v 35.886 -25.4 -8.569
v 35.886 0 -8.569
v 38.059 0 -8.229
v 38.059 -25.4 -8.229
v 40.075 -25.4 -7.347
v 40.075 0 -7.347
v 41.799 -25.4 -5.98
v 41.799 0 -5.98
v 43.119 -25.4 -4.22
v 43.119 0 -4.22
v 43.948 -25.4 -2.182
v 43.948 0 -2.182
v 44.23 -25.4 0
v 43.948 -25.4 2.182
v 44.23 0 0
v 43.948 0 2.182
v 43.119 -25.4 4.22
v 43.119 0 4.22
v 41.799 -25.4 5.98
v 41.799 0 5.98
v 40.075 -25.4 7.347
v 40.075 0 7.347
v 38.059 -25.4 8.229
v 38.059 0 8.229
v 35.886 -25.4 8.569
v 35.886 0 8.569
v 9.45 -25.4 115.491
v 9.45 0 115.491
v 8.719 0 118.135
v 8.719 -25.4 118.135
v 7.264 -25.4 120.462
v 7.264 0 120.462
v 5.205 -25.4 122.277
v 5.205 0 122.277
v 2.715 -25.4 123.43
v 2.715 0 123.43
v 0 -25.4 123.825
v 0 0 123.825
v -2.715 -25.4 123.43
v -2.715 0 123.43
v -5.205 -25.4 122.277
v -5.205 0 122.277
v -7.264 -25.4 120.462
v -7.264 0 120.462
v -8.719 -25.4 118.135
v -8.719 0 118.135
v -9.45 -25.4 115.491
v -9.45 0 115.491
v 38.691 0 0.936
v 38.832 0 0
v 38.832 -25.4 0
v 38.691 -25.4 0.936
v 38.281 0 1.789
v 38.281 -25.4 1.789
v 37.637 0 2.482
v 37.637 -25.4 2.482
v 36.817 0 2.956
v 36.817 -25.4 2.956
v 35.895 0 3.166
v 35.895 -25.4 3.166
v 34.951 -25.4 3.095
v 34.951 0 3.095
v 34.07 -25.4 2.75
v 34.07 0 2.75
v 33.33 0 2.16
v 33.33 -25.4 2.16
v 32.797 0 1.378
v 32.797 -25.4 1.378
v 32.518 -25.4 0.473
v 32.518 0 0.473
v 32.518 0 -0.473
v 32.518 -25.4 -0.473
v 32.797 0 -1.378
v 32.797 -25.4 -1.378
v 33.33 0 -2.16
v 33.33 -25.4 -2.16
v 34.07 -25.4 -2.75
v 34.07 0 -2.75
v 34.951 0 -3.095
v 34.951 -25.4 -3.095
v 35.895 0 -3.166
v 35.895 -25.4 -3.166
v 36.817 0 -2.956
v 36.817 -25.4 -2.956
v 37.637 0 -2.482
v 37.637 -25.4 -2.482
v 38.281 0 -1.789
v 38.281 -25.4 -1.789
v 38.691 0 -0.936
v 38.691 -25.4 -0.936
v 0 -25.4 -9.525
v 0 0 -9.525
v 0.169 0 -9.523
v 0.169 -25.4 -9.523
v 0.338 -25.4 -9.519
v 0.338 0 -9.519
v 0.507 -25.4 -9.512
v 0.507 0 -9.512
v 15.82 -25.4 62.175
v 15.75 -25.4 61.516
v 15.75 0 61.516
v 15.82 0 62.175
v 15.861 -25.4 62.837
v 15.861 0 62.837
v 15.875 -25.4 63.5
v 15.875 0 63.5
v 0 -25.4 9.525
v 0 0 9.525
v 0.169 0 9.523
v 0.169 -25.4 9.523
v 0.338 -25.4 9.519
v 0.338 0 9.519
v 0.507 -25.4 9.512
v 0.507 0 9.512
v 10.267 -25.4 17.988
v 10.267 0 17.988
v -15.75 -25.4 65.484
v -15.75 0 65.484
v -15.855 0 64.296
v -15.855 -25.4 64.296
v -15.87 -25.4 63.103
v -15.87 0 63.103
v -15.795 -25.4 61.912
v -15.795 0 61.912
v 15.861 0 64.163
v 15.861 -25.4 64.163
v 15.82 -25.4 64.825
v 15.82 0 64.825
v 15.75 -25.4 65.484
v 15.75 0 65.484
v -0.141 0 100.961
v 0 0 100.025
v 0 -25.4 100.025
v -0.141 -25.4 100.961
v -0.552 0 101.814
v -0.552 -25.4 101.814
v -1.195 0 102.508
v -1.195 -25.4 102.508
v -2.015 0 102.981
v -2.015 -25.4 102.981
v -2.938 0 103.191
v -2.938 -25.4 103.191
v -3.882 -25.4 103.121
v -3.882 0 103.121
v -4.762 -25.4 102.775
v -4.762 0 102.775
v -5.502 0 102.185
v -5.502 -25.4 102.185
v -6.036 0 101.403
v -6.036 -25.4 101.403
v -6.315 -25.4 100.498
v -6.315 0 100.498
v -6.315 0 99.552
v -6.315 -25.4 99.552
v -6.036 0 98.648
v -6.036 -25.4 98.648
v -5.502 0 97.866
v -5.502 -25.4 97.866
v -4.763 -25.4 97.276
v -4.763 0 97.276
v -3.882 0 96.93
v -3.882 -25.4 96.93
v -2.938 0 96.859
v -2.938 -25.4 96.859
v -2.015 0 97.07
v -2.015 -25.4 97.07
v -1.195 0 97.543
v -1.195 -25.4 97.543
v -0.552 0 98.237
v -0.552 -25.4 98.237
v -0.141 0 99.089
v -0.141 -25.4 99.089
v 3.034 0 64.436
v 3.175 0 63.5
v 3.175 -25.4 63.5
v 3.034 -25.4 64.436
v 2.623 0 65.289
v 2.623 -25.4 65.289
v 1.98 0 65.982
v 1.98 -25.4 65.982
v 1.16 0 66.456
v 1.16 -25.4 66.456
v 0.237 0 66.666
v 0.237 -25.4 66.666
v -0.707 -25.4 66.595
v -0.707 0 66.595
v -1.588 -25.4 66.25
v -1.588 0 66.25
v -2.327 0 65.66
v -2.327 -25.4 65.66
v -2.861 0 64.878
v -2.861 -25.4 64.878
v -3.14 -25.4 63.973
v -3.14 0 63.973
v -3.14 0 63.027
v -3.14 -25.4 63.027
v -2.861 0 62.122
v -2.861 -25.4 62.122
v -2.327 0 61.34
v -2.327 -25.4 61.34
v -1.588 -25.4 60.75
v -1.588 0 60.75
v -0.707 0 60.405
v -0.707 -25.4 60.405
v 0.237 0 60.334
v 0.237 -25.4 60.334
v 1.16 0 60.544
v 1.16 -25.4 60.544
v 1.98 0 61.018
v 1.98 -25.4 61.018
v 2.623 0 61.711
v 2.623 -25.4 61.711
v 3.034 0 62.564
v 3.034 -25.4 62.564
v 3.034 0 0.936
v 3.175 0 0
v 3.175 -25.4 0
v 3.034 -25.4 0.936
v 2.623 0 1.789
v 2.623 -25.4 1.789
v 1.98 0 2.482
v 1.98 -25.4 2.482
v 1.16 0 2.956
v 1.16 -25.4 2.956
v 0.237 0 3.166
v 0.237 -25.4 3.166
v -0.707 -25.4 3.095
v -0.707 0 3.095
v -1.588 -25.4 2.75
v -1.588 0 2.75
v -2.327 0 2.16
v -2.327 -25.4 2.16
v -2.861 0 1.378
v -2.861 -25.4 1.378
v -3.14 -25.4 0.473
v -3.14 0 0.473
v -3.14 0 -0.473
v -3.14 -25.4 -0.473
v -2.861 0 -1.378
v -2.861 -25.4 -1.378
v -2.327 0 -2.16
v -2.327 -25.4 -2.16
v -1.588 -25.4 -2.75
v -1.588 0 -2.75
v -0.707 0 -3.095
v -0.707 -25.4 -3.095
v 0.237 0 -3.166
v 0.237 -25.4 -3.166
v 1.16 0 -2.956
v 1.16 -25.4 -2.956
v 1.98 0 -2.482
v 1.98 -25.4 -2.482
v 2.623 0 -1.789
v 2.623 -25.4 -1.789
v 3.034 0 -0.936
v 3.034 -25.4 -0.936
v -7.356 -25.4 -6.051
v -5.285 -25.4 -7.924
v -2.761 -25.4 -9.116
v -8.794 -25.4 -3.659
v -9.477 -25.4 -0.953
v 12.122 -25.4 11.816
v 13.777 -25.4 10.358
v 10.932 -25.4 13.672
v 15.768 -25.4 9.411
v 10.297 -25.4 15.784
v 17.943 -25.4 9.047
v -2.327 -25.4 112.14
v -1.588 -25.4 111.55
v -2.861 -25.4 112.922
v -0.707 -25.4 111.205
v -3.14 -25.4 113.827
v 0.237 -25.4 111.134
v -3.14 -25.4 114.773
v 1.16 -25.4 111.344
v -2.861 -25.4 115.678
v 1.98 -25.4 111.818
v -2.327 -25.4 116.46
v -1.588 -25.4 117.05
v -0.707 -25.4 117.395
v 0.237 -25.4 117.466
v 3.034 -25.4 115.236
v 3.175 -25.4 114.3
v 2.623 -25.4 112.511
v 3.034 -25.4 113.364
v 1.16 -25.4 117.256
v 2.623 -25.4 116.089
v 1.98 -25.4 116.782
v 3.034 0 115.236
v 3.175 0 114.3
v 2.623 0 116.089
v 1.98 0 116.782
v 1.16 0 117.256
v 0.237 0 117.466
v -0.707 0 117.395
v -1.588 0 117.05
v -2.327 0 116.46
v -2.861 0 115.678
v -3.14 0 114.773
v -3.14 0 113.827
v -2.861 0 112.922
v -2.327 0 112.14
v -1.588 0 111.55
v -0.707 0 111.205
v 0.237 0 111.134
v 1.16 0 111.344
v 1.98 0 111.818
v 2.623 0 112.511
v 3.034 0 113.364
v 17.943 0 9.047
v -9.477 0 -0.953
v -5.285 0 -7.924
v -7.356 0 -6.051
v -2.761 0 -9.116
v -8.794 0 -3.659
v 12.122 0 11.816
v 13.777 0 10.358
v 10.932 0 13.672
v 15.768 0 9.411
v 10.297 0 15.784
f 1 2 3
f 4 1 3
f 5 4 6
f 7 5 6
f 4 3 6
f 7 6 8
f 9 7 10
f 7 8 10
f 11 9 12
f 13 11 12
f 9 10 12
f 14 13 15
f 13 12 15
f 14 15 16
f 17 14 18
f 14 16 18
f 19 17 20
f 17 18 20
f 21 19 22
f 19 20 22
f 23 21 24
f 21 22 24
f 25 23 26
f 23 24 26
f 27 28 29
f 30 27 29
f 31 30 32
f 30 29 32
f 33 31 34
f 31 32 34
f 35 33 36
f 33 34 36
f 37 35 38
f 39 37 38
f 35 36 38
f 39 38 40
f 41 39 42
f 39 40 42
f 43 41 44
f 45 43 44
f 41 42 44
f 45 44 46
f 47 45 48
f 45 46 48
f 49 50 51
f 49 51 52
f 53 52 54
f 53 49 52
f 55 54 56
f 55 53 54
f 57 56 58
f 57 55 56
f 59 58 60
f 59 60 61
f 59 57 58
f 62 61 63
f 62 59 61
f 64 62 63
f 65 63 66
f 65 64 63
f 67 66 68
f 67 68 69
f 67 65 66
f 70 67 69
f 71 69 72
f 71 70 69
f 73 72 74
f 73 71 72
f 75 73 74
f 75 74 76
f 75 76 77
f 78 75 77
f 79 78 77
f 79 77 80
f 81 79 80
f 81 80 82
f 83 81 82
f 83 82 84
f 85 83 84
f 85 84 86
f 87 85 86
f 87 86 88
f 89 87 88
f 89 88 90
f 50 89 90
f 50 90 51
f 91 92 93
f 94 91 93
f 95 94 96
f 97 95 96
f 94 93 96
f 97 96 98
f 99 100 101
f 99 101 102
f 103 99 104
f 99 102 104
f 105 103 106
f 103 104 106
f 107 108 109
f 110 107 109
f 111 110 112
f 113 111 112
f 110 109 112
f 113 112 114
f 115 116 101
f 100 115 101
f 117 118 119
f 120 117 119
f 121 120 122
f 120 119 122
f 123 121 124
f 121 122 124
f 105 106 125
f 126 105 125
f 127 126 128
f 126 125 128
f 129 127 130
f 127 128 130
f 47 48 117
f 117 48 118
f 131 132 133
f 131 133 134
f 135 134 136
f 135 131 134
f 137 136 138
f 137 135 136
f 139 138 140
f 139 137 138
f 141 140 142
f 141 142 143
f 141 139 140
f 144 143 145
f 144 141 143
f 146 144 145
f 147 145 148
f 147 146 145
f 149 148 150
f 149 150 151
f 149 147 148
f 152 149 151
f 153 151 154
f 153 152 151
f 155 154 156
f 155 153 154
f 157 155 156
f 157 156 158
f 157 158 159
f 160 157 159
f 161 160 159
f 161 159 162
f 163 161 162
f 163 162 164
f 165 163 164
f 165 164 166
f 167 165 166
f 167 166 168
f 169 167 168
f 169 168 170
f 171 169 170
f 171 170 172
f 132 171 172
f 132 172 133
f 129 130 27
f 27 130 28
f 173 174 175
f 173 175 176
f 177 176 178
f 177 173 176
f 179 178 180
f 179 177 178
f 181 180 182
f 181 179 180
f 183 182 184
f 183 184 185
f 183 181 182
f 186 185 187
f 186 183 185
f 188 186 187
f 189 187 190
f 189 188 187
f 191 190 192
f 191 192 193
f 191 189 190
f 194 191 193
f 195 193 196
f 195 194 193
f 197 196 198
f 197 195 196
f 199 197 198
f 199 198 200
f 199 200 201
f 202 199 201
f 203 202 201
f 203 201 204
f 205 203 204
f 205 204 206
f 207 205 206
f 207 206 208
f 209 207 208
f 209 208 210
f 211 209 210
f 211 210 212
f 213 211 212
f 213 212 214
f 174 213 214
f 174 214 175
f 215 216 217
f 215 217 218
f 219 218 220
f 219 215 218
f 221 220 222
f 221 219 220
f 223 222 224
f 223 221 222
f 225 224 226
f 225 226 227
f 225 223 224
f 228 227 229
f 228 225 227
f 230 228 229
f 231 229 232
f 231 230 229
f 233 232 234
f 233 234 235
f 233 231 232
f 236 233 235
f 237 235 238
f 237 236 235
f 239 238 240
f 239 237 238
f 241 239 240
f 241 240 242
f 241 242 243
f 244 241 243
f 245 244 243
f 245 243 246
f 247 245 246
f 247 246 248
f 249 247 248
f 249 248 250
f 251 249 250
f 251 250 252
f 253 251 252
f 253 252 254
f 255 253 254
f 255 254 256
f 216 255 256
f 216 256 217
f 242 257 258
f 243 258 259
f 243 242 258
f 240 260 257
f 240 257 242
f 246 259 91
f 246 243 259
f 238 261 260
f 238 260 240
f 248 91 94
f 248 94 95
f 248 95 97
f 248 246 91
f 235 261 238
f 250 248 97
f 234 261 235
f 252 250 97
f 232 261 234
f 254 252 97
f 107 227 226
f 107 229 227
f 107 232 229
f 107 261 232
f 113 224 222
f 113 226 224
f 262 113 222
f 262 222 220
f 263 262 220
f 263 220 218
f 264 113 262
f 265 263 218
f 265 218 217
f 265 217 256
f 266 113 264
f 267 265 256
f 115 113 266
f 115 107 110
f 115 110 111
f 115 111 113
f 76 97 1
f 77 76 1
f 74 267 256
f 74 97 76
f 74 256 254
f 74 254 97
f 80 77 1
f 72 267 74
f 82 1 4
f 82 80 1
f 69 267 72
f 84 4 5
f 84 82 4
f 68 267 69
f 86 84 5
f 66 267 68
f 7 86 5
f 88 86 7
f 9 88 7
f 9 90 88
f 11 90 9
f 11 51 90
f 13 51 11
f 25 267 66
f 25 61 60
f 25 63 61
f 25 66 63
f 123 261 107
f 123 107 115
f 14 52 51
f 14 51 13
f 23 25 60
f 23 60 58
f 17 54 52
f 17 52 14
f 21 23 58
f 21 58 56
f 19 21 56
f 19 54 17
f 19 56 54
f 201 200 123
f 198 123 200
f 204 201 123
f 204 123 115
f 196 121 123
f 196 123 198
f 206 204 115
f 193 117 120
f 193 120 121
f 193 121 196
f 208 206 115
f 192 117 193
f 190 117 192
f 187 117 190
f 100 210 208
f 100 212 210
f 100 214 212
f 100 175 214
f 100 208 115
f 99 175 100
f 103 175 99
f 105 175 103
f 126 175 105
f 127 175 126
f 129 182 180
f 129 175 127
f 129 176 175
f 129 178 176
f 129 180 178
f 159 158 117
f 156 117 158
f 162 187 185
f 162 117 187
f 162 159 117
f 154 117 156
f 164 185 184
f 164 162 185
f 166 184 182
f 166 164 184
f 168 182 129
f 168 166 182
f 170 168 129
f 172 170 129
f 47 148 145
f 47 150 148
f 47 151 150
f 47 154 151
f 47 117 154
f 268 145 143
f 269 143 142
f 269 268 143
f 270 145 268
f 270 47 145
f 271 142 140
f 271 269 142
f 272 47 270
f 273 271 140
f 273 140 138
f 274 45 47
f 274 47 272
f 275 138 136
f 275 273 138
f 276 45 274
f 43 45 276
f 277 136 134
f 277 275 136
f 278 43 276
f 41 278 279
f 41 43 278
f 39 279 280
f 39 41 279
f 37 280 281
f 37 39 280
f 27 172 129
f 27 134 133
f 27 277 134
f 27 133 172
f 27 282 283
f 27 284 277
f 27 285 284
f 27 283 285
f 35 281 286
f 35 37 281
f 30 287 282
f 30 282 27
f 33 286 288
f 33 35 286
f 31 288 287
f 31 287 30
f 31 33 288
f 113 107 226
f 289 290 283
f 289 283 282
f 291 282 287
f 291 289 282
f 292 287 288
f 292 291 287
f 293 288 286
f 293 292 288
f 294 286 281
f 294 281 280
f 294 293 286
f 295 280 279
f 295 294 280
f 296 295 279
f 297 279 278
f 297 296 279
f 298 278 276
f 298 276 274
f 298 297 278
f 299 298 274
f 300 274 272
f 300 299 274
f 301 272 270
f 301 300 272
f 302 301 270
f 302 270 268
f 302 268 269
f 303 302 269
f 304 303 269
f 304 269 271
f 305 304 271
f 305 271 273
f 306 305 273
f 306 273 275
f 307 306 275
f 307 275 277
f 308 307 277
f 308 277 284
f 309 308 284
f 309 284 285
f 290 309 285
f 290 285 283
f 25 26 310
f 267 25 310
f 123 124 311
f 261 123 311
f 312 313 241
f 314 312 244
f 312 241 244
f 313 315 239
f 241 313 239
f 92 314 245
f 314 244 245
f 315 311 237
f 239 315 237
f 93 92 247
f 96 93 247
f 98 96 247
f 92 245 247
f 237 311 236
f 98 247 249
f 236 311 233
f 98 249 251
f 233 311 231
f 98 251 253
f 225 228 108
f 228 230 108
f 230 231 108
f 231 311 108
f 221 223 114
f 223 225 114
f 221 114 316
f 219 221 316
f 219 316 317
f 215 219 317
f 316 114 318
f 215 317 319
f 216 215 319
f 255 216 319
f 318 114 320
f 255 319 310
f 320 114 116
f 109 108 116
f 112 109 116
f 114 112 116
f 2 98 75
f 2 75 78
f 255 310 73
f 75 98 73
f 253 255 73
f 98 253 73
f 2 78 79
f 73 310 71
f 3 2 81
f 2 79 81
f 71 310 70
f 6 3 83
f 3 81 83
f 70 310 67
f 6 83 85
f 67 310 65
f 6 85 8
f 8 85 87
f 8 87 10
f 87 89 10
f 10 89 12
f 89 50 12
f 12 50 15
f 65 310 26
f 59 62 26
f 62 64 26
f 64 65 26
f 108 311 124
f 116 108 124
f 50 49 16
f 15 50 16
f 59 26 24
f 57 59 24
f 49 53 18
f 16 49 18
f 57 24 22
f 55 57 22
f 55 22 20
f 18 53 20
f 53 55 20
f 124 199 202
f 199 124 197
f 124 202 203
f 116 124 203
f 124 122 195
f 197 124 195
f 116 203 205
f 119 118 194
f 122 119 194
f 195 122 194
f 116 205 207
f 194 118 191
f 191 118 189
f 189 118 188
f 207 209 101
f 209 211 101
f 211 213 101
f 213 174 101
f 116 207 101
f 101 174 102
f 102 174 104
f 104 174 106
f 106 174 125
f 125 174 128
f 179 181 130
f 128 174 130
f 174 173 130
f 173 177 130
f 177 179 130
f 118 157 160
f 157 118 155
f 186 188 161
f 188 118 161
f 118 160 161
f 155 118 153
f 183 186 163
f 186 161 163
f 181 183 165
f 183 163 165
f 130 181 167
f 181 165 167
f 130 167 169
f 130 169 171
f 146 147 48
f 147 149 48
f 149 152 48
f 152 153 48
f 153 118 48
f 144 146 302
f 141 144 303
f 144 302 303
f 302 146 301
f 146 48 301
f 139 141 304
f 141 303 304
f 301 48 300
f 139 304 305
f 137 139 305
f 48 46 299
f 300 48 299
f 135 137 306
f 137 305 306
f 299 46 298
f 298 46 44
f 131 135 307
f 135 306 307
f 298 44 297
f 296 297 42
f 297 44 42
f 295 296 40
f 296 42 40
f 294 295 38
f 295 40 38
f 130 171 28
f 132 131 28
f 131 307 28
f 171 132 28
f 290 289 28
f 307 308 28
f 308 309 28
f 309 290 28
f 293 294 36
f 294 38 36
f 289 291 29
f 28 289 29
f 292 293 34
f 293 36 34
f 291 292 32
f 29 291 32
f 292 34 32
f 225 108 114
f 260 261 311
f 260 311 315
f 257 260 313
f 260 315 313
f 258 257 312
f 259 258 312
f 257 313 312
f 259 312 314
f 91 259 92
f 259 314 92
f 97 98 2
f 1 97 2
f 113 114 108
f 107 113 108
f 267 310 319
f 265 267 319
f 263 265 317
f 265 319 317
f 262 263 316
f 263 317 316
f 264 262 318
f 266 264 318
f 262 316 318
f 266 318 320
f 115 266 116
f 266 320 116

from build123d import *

# Parameters (mm, degrees)
F0_R     = 3.175
F1_DEPTH = 3.048
F2_DEPTH = 25.4
F3_DEPTH = 3.048


with BuildPart() as f1:
    # F0 (on Front) → F1 (new body)
    with BuildSketch(Plane.XZ):
        with BuildLine():
            ThreePointArc((-9.450293, 115.490625), (-0.596483, 104.793695), (9.525, 114.3))
            ThreePointArc((9.525, 114.3), (9.506305, 114.896483), (9.450293, 115.490625))
            ThreePointArc((9.450293, 115.490625), (0, 123.825), (-9.450293, 115.490625))
        make_face()
        with Locations((0, 114.3)):
            Circle(F0_R, mode=Mode.SUBTRACT)
        with BuildLine():
            ThreePointArc((9.450293, 115.490625), (9.506305, 114.896483), (9.525, 114.3))
            ThreePointArc((9.525, 114.3), (-0.596483, 104.793695), (-9.450293, 115.490625))
            Line((-9.450293, 115.490625), (-15.750488, 65.484375))
            ThreePointArc((-15.750488, 65.484375), (0, 79.375), (15.750488, 65.484375))
            Line((15.750488, 65.484375), (9.450293, 115.490625))
        make_face()
        with Locations((-3.175, 100.0252)):
            Circle(F0_R, mode=Mode.SUBTRACT)
        with BuildLine():
            ThreePointArc((15.875, 63.5), (15.843841, 64.494139), (15.750488, 65.484375))
            ThreePointArc((15.750488, 65.484375), (0, 79.375), (-15.750488, 65.484375))
            ThreePointArc((-15.750488, 65.484375), (-15.873744, 63.699705), (-15.795426, 61.9125))
            ThreePointArc((-15.795426, 61.9125), (-0.199705, 47.626256), (15.750488, 61.515625))
            ThreePointArc((15.750488, 61.515625), (15.843841, 62.505861), (15.875, 63.5))
        make_face()
        with Locations((0, 63.5)):
            Circle(F0_R, mode=Mode.SUBTRACT)
        with BuildLine():
            ThreePointArc((15.750488, 61.515625), (-0.199705, 47.626256), (-15.795426, 61.9125))
            Line((-15.795426, 61.9125), (-9.477255, -0.9525))
            ThreePointArc((-9.477255, -0.9525), (-7.063929, 6.389564), (0, 9.525))
            ThreePointArc((0, 9.525), (0.253535, 9.521625), (0.506891, 9.511503))
            ThreePointArc((0.506891, 9.511503), (6.912082, 6.553529), (9.525, 0))
            ThreePointArc((9.525, 0), (6.912082, -6.553529), (0.506891, -9.511503))
            Line((0.506891, -9.511503), (35.885598, -8.569463))
            ThreePointArc((35.885598, -8.569463), (27.084916, 0), (35.885598, 8.569463))
            Line((35.885598, 8.569463), (17.942799, 9.047231))
            ThreePointArc((17.942799, 9.047231), (12.122303, 11.815881), (10.266572, 17.988389))
            Line((10.266572, 17.988389), (15.750488, 61.515625))
        make_face()
        with BuildLine():
            ThreePointArc((0, 9.525), (-7.063929, 6.389564), (-9.477255, -0.9525))
            ThreePointArc((-9.477255, -0.9525), (-6.389564, -7.063929), (0, -9.525))
            Line((0, -9.525), (0.506891, -9.511503))
            ThreePointArc((0.506891, -9.511503), (6.912082, -6.553529), (9.525, 0))
            ThreePointArc((9.525, 0), (6.912082, 6.553529), (0.506891, 9.511503))
            Line((0.506891, 9.511503), (0, 9.525))
        make_face()
        Circle(F0_R, mode=Mode.SUBTRACT)
        with BuildLine():
            Line((0.506891, -9.511503), (0, -9.525))
            ThreePointArc((0, -9.525), (0.253535, -9.521625), (0.506891, -9.511503))
        make_face()
        with BuildLine():
            ThreePointArc((44.229916, 0), (41.799234, 5.980454), (35.885598, 8.569463))
            ThreePointArc((35.885598, 8.569463), (27.084916, 0), (35.885598, -8.569463))
            ThreePointArc((35.885598, -8.569463), (41.799234, -5.980454), (44.229916, 0))
        make_face()
        with Locations((35.657416, 0)):
            Circle(F0_R, mode=Mode.SUBTRACT)
    extrude(amount=F1_DEPTH)

    # F0 (on Front) → F2 (join)
    with BuildSketch(Plane.XZ):
        with BuildLine():
            ThreePointArc((-9.450293, 115.490625), (-0.596483, 104.793695), (9.525, 114.3))
            ThreePointArc((9.525, 114.3), (9.506305, 114.896483), (9.450293, 115.490625))
            ThreePointArc((9.450293, 115.490625), (0, 123.825), (-9.450293, 115.490625))
        make_face()
        with Locations((0, 114.3)):
            Circle(F0_R, mode=Mode.SUBTRACT)
        with BuildLine():
            ThreePointArc((9.450293, 115.490625), (9.506305, 114.896483), (9.525, 114.3))
            ThreePointArc((9.525, 114.3), (-0.596483, 104.793695), (-9.450293, 115.490625))
            Line((-9.450293, 115.490625), (-15.750488, 65.484375))
            ThreePointArc((-15.750488, 65.484375), (0, 79.375), (15.750488, 65.484375))
            Line((15.750488, 65.484375), (9.450293, 115.490625))
        make_face()
        with Locations((-3.175, 100.0252)):
            Circle(F0_R, mode=Mode.SUBTRACT)
        with BuildLine():
            ThreePointArc((15.875, 63.5), (15.843841, 64.494139), (15.750488, 65.484375))
            ThreePointArc((15.750488, 65.484375), (0, 79.375), (-15.750488, 65.484375))
            ThreePointArc((-15.750488, 65.484375), (-15.873744, 63.699705), (-15.795426, 61.9125))
            ThreePointArc((-15.795426, 61.9125), (-0.199705, 47.626256), (15.750488, 61.515625))
            ThreePointArc((15.750488, 61.515625), (15.843841, 62.505861), (15.875, 63.5))
        make_face()
        with Locations((0, 63.5)):
            Circle(F0_R, mode=Mode.SUBTRACT)
        with BuildLine():
            ThreePointArc((15.750488, 61.515625), (-0.199705, 47.626256), (-15.795426, 61.9125))
            Line((-15.795426, 61.9125), (-9.477255, -0.9525))
            ThreePointArc((-9.477255, -0.9525), (-7.063929, 6.389564), (0, 9.525))
            ThreePointArc((0, 9.525), (0.253535, 9.521625), (0.506891, 9.511503))
            ThreePointArc((0.506891, 9.511503), (6.912082, 6.553529), (9.525, 0))
            ThreePointArc((9.525, 0), (6.912082, -6.553529), (0.506891, -9.511503))
            Line((0.506891, -9.511503), (35.885598, -8.569463))
            ThreePointArc((35.885598, -8.569463), (27.084916, 0), (35.885598, 8.569463))
            Line((35.885598, 8.569463), (17.942799, 9.047231))
            ThreePointArc((17.942799, 9.047231), (12.122303, 11.815881), (10.266572, 17.988389))
            Line((10.266572, 17.988389), (15.750488, 61.515625))
        make_face()
        with BuildLine():
            ThreePointArc((0, 9.525), (-7.063929, 6.389564), (-9.477255, -0.9525))
            ThreePointArc((-9.477255, -0.9525), (-6.389564, -7.063929), (0, -9.525))
            Line((0, -9.525), (0.506891, -9.511503))
            ThreePointArc((0.506891, -9.511503), (6.912082, -6.553529), (9.525, 0))
            ThreePointArc((9.525, 0), (6.912082, 6.553529), (0.506891, 9.511503))
            Line((0.506891, 9.511503), (0, 9.525))
        make_face()
        Circle(F0_R, mode=Mode.SUBTRACT)
        with BuildLine():
            Line((0.506891, -9.511503), (0, -9.525))
            ThreePointArc((0, -9.525), (0.253535, -9.521625), (0.506891, -9.511503))
        make_face()
        with BuildLine():
            ThreePointArc((44.229916, 0), (41.799234, 5.980454), (35.885598, 8.569463))
            ThreePointArc((35.885598, 8.569463), (27.084916, 0), (35.885598, -8.569463))
            ThreePointArc((35.885598, -8.569463), (41.799234, -5.980454), (44.229916, 0))
        make_face()
        with Locations((35.657416, 0)):
            Circle(F0_R, mode=Mode.SUBTRACT)
    extrude(amount=F2_DEPTH)

    # F0 (on Front) → F3 (join)
    with BuildSketch(Plane.XZ):
        with BuildLine():
            ThreePointArc((-9.450293, 115.490625), (-0.596483, 104.793695), (9.525, 114.3))
            ThreePointArc((9.525, 114.3), (9.506305, 114.896483), (9.450293, 115.490625))
            ThreePointArc((9.450293, 115.490625), (0, 123.825), (-9.450293, 115.490625))
        make_face()
        with Locations((0, 114.3)):
            Circle(F0_R, mode=Mode.SUBTRACT)
        with BuildLine():
            ThreePointArc((9.450293, 115.490625), (9.506305, 114.896483), (9.525, 114.3))
            ThreePointArc((9.525, 114.3), (-0.596483, 104.793695), (-9.450293, 115.490625))
            Line((-9.450293, 115.490625), (-15.750488, 65.484375))
            ThreePointArc((-15.750488, 65.484375), (0, 79.375), (15.750488, 65.484375))
            Line((15.750488, 65.484375), (9.450293, 115.490625))
        make_face()
        with Locations((-3.175, 100.0252)):
            Circle(F0_R, mode=Mode.SUBTRACT)
        with BuildLine():
            ThreePointArc((15.875, 63.5), (15.843841, 64.494139), (15.750488, 65.484375))
            ThreePointArc((15.750488, 65.484375), (0, 79.375), (-15.750488, 65.484375))
            ThreePointArc((-15.750488, 65.484375), (-15.873744, 63.699705), (-15.795426, 61.9125))
            ThreePointArc((-15.795426, 61.9125), (-0.199705, 47.626256), (15.750488, 61.515625))
            ThreePointArc((15.750488, 61.515625), (15.843841, 62.505861), (15.875, 63.5))
        make_face()
        with Locations((0, 63.5)):
            Circle(F0_R, mode=Mode.SUBTRACT)
        with BuildLine():
            ThreePointArc((15.750488, 61.515625), (-0.199705, 47.626256), (-15.795426, 61.9125))
            Line((-15.795426, 61.9125), (-9.477255, -0.9525))
            ThreePointArc((-9.477255, -0.9525), (-7.063929, 6.389564), (0, 9.525))
            ThreePointArc((0, 9.525), (0.253535, 9.521625), (0.506891, 9.511503))
            ThreePointArc((0.506891, 9.511503), (6.912082, 6.553529), (9.525, 0))
            ThreePointArc((9.525, 0), (6.912082, -6.553529), (0.506891, -9.511503))
            Line((0.506891, -9.511503), (35.885598, -8.569463))
            ThreePointArc((35.885598, -8.569463), (27.084916, 0), (35.885598, 8.569463))
            Line((35.885598, 8.569463), (17.942799, 9.047231))
            ThreePointArc((17.942799, 9.047231), (12.122303, 11.815881), (10.266572, 17.988389))
            Line((10.266572, 17.988389), (15.750488, 61.515625))
        make_face()
        with BuildLine():
            ThreePointArc((0, 9.525), (-7.063929, 6.389564), (-9.477255, -0.9525))
            ThreePointArc((-9.477255, -0.9525), (-6.389564, -7.063929), (0, -9.525))
            Line((0, -9.525), (0.506891, -9.511503))
            ThreePointArc((0.506891, -9.511503), (6.912082, -6.553529), (9.525, 0))
            ThreePointArc((9.525, 0), (6.912082, 6.553529), (0.506891, 9.511503))
            Line((0.506891, 9.511503), (0, 9.525))
        make_face()
        Circle(F0_R, mode=Mode.SUBTRACT)
        with BuildLine():
            Line((0.506891, -9.511503), (0, -9.525))
            ThreePointArc((0, -9.525), (0.253535, -9.521625), (0.506891, -9.511503))
        make_face()
        with BuildLine():
            ThreePointArc((44.229916, 0), (41.799234, 5.980454), (35.885598, 8.569463))
            ThreePointArc((35.885598, 8.569463), (27.084916, 0), (35.885598, -8.569463))
            ThreePointArc((35.885598, -8.569463), (41.799234, -5.980454), (44.229916, 0))
        make_face()
        with Locations((35.657416, 0)):
            Circle(F0_R, mode=Mode.SUBTRACT)
    extrude(amount=F3_DEPTH)


solid = f1.part
